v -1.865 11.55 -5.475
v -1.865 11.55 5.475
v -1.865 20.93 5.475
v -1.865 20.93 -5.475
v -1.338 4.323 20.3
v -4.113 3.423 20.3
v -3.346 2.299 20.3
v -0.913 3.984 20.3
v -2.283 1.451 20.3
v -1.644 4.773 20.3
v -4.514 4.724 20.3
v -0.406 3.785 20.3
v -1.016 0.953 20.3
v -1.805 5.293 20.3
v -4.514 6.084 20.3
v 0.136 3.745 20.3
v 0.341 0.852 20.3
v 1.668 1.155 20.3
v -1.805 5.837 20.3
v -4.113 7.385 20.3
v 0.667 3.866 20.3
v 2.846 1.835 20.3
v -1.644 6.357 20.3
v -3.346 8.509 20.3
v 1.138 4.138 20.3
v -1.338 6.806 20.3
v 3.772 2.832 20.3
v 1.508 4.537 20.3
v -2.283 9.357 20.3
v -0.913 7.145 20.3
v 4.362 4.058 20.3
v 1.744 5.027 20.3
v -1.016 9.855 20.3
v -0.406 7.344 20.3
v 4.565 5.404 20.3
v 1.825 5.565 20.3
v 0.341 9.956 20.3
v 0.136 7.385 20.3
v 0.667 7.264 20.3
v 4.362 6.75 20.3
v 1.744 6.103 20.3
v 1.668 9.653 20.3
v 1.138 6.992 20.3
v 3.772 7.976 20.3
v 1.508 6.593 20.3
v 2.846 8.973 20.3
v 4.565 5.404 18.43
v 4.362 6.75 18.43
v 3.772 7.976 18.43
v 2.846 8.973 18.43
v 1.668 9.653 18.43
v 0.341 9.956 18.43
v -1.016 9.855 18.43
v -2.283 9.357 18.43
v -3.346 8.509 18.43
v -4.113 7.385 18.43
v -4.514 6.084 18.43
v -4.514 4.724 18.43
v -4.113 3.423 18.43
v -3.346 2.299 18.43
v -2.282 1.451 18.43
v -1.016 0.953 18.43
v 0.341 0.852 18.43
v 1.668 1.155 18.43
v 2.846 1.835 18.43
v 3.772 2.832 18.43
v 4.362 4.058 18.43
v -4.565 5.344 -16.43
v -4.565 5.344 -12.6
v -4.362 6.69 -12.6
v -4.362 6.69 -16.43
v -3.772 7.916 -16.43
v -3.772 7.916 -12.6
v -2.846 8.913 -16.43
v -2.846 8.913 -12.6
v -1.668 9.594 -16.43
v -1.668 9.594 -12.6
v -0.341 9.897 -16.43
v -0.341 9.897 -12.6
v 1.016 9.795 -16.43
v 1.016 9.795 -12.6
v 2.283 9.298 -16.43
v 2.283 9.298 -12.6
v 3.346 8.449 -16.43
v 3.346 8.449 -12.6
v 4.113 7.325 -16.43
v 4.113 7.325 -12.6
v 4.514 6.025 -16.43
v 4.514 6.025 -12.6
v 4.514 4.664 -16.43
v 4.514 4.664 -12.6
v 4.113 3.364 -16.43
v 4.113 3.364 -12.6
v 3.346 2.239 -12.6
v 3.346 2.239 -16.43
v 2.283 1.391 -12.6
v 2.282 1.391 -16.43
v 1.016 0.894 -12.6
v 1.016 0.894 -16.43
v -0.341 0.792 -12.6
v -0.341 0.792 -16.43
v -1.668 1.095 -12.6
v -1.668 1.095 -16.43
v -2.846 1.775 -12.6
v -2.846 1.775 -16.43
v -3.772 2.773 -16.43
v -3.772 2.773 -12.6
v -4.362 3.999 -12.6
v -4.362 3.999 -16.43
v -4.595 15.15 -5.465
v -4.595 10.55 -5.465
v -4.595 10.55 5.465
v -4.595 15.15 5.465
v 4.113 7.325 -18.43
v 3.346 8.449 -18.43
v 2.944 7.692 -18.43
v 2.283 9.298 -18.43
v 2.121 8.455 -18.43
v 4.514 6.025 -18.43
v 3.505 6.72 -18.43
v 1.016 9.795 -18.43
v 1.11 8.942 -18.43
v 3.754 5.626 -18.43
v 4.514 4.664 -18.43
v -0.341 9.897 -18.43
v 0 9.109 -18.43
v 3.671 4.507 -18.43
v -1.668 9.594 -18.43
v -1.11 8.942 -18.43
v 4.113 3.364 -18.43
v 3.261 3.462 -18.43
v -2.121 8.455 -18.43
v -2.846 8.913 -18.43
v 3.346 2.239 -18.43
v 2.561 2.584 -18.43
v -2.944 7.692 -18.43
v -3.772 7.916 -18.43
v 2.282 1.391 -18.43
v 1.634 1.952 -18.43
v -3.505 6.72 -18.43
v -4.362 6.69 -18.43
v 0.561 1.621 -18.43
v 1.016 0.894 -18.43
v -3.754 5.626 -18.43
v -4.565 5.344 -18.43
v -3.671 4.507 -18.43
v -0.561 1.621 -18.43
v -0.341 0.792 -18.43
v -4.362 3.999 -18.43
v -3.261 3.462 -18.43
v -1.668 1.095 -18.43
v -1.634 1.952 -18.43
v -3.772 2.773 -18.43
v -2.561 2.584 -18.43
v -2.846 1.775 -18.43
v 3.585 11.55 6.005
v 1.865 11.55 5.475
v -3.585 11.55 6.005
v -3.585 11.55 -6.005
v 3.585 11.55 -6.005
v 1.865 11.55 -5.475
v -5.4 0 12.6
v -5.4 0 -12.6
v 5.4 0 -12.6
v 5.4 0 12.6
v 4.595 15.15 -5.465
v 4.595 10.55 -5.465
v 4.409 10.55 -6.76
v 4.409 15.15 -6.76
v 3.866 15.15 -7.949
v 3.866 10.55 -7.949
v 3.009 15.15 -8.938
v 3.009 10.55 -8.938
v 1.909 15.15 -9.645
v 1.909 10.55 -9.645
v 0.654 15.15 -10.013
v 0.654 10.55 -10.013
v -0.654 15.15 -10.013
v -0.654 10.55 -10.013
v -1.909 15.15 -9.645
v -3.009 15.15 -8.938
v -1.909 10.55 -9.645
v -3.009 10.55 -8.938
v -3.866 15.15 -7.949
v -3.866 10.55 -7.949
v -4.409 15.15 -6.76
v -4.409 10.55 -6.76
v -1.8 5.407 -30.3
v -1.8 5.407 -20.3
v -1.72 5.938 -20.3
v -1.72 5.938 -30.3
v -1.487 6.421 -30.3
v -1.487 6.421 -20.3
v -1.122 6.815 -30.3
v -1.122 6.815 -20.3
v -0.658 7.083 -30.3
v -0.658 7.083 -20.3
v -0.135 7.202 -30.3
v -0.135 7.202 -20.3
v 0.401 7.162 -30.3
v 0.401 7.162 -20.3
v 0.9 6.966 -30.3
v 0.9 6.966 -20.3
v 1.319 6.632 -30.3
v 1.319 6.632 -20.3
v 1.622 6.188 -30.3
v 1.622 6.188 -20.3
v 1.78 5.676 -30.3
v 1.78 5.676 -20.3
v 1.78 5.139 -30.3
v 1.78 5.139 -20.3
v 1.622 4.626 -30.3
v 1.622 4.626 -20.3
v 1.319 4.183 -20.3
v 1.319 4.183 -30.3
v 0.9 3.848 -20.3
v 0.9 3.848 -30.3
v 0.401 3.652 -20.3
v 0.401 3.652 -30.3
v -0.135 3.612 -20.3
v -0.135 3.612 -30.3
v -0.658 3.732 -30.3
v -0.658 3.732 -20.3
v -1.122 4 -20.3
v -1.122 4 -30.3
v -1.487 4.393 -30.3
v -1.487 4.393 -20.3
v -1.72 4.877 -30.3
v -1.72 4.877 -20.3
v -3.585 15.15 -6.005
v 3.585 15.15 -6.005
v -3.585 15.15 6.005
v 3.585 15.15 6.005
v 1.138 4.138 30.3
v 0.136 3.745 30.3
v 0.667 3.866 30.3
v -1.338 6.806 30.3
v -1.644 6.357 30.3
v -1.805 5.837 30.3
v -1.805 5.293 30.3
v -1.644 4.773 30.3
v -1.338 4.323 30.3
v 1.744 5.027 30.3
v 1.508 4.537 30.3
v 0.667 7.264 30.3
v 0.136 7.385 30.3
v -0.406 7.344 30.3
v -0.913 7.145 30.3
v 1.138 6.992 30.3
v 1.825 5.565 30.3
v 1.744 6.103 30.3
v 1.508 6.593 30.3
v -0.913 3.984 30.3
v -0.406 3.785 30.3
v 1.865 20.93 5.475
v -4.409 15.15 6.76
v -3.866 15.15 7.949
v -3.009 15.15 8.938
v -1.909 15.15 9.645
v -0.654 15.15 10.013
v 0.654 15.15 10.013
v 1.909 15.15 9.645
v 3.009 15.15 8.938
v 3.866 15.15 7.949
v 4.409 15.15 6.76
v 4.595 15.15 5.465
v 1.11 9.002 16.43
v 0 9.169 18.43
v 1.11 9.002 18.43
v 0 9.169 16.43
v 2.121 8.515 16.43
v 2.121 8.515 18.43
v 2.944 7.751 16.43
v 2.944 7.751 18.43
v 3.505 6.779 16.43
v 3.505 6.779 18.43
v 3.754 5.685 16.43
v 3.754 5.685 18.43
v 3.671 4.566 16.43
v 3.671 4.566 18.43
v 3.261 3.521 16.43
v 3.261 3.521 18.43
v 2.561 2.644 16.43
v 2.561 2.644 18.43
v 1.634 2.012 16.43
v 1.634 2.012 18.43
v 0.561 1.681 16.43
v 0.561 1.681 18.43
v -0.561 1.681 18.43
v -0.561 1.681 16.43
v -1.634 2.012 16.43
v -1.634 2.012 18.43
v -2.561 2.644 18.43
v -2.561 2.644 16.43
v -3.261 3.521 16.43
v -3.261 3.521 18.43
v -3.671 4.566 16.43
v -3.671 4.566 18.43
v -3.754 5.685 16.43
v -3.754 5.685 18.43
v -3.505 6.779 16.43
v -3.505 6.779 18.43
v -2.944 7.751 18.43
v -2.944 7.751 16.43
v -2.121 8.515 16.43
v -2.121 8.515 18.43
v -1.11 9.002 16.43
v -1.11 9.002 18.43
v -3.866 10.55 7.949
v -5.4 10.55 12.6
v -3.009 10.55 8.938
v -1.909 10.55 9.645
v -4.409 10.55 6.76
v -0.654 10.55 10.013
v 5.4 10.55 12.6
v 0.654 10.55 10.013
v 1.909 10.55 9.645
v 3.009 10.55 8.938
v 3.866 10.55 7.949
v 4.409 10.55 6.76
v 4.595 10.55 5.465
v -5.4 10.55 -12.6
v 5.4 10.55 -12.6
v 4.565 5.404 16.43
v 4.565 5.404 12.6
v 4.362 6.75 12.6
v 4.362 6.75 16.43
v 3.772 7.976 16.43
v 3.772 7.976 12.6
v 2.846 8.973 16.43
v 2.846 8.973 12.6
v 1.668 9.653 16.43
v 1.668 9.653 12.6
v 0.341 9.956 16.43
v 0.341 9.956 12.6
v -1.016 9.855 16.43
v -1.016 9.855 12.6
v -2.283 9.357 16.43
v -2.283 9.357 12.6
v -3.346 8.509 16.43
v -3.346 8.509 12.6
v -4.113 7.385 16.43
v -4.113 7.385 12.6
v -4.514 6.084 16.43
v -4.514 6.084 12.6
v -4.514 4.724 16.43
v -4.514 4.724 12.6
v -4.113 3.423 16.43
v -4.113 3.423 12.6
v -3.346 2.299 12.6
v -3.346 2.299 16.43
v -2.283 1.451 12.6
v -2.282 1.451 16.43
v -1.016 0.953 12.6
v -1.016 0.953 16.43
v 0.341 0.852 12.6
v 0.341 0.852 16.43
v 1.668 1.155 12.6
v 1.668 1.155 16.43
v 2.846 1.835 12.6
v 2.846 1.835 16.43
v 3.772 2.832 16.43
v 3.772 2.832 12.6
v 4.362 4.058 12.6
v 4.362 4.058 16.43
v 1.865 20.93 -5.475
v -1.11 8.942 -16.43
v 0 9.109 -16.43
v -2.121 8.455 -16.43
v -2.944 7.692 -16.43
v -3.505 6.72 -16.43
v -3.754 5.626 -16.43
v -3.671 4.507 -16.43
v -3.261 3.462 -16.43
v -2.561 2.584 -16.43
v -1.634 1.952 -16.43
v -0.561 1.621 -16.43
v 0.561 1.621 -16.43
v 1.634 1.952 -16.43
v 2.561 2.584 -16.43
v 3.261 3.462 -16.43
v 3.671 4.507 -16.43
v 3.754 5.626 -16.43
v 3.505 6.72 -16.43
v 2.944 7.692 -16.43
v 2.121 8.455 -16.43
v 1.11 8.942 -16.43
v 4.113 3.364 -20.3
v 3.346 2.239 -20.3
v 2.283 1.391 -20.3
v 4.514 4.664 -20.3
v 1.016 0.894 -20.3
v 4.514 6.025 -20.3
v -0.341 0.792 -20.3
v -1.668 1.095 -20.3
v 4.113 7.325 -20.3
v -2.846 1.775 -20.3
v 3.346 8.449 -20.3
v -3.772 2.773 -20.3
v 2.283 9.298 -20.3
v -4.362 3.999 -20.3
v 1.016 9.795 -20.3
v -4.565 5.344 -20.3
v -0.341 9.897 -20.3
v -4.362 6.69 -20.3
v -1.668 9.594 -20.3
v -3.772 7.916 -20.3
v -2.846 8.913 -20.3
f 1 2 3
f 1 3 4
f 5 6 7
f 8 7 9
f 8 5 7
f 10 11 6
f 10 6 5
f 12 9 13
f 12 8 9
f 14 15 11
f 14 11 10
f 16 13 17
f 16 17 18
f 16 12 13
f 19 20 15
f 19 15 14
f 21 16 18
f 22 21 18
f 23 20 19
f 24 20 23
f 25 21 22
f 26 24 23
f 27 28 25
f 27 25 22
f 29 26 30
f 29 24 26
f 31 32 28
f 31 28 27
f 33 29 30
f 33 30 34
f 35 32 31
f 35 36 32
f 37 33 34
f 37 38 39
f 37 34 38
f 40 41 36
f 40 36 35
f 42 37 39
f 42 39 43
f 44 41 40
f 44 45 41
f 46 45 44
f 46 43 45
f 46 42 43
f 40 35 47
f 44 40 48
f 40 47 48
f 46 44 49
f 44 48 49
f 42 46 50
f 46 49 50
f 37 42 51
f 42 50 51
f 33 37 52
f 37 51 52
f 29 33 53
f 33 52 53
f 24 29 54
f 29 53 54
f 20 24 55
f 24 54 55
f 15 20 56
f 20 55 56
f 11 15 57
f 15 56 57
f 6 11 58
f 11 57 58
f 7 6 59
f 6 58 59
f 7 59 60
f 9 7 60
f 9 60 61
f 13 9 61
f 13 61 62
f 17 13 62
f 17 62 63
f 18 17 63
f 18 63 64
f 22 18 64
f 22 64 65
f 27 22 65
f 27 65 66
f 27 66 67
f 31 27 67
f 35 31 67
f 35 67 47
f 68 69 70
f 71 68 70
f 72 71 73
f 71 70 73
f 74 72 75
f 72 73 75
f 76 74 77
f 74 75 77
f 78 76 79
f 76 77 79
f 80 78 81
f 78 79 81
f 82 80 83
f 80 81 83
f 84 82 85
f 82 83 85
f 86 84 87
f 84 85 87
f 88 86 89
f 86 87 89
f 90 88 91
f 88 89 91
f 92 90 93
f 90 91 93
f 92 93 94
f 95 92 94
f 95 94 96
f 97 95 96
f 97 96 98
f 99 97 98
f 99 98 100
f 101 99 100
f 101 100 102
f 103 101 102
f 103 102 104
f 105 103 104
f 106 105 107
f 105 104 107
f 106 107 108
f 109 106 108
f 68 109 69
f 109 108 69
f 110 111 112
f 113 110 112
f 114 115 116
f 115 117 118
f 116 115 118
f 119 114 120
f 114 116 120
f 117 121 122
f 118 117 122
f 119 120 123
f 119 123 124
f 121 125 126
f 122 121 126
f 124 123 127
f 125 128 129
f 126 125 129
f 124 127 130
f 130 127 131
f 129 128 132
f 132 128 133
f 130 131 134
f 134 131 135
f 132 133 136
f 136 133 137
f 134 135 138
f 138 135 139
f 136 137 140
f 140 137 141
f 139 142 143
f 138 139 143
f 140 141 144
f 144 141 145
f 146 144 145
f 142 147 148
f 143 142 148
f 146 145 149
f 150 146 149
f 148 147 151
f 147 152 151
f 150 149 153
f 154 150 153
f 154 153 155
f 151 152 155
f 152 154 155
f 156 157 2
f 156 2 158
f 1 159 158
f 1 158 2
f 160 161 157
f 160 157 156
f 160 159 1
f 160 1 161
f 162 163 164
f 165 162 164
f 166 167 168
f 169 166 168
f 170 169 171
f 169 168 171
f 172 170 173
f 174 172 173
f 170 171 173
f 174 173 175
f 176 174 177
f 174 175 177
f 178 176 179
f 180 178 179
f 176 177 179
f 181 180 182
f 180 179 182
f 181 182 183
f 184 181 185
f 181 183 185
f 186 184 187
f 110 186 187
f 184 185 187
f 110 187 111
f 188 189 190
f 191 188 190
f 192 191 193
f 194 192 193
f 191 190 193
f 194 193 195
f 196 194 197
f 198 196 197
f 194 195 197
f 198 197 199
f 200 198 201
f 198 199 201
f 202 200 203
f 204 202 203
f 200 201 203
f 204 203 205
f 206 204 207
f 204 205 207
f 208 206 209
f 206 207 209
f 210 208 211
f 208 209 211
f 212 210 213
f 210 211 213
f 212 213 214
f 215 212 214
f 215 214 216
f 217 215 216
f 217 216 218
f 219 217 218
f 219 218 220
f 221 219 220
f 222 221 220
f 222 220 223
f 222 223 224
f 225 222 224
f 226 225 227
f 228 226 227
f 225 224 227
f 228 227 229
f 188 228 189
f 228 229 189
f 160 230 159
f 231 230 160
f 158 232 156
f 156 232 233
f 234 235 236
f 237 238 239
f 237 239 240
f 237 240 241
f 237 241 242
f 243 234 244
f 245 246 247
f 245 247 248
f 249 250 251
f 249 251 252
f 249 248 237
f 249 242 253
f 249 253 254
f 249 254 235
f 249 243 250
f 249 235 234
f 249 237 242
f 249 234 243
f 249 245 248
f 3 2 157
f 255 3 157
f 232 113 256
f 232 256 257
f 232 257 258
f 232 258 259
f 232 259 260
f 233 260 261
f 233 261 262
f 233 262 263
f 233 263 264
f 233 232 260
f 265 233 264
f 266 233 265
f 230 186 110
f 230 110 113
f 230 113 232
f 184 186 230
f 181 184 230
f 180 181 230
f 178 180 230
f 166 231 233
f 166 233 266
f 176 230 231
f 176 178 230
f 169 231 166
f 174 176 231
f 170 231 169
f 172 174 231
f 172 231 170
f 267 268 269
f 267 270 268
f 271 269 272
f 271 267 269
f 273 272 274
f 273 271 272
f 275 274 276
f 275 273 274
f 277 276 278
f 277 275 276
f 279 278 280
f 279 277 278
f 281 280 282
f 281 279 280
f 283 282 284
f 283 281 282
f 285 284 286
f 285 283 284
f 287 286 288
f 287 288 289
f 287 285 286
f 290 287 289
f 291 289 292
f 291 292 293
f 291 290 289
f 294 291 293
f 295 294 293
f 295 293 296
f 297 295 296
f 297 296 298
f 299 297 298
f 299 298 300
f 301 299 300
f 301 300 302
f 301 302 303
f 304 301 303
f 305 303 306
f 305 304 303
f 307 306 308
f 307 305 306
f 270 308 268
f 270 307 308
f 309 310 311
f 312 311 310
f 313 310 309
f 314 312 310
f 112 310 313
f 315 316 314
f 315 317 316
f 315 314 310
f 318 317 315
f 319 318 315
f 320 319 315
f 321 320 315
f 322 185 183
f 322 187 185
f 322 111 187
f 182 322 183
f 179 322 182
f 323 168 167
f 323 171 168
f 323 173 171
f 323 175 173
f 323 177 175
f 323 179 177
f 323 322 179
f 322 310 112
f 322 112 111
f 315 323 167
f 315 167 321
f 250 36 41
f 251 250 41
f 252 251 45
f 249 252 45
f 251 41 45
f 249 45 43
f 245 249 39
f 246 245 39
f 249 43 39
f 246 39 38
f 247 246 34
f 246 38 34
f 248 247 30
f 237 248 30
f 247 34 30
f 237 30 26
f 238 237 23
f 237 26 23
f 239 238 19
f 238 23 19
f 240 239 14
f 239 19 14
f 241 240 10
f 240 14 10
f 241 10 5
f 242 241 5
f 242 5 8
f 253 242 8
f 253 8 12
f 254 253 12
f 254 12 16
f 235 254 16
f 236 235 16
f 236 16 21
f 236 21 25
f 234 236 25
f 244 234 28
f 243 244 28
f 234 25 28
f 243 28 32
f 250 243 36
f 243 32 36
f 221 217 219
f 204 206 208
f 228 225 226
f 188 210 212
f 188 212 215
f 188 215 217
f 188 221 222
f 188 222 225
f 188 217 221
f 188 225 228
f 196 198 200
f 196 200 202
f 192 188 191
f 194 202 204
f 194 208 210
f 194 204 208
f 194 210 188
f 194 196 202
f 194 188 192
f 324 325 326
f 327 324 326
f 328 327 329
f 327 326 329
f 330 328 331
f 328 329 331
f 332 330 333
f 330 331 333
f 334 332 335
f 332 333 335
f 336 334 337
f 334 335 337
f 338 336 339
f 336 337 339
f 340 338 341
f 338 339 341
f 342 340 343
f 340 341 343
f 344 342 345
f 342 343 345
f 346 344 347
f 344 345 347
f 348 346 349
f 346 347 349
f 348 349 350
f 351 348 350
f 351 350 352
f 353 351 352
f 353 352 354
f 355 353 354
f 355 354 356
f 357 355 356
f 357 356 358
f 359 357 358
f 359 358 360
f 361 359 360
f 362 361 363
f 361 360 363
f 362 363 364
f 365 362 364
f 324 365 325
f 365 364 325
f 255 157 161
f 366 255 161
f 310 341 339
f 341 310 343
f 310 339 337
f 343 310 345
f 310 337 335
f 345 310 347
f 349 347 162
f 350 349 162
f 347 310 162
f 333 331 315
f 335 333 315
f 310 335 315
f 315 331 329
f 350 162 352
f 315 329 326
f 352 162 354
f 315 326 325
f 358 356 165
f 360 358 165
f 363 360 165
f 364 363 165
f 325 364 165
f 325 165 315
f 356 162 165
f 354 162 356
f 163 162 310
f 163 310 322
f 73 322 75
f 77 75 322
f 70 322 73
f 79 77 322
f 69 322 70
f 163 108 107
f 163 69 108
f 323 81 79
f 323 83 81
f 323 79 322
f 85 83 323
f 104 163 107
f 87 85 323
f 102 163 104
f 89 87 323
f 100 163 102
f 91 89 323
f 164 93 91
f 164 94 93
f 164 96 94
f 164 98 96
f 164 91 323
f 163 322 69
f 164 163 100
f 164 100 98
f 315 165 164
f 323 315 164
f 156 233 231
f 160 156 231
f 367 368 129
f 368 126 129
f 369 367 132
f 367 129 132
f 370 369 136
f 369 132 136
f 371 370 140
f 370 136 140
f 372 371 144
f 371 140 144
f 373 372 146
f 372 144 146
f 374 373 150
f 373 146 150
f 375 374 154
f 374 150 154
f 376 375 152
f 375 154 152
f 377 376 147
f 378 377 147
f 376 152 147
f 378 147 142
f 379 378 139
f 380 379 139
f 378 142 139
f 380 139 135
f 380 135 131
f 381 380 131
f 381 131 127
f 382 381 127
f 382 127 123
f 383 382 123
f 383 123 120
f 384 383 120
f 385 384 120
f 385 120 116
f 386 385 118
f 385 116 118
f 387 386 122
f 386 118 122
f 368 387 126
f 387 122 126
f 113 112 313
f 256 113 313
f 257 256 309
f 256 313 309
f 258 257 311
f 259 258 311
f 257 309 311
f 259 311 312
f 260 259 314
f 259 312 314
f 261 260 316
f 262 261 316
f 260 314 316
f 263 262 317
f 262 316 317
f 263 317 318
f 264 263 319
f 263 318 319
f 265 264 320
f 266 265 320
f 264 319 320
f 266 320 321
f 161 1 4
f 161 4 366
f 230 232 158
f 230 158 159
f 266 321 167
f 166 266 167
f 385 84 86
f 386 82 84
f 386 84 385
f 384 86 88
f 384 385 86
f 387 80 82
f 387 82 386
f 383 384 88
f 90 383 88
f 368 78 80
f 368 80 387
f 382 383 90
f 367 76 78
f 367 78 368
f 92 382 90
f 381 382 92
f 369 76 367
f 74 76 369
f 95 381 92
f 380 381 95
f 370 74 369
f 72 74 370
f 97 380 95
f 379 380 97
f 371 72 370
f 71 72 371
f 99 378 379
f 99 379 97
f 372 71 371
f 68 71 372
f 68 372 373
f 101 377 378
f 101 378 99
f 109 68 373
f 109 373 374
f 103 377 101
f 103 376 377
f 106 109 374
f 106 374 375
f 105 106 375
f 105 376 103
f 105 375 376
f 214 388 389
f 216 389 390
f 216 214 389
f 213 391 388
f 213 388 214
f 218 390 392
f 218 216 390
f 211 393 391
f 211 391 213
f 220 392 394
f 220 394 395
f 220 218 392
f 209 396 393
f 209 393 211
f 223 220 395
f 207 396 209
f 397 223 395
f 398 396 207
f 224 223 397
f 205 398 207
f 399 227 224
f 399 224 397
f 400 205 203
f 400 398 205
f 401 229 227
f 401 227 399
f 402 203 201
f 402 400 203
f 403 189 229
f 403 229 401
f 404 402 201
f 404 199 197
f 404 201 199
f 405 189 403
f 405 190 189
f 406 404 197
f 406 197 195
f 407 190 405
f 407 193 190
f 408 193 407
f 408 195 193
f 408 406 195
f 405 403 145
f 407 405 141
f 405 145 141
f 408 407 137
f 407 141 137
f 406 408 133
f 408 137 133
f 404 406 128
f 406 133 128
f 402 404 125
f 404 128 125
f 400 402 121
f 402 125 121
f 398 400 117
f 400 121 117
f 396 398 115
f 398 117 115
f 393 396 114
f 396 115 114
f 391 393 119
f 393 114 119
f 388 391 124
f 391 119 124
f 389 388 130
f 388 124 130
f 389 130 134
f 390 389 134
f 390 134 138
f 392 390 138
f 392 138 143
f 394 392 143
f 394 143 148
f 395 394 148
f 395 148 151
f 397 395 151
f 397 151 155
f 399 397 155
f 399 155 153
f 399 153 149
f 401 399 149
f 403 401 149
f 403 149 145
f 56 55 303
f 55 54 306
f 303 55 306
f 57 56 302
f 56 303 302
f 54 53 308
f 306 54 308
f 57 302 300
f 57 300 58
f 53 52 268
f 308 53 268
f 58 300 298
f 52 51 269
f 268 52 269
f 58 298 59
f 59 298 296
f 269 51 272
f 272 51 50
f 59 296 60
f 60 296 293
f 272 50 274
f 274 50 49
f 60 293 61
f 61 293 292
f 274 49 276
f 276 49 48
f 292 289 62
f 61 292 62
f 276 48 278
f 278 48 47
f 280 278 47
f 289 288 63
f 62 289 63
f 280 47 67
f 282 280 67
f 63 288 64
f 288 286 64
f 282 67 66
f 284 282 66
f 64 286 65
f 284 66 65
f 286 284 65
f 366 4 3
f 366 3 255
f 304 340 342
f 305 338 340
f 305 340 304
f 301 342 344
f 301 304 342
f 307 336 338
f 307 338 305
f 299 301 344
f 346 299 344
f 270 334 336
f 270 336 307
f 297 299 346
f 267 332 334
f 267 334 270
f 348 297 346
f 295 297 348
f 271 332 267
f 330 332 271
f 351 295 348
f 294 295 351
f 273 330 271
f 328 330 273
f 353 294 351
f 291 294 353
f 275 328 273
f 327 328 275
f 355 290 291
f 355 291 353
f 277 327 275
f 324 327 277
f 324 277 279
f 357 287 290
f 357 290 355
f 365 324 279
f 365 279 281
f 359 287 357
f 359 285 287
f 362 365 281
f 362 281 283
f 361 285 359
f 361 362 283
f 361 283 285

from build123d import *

# Parameters (mm, degrees)
SKETCH1_W           = 10.8
SKETCH1_H           = 25.2
BOSS_EXTRUDE1_DEPTH = 10.55
SKETCH2_R           = 4.565
BOSS_EXTRUDE2_DEPTH = 7.7
SKETCH3_R           = 4.565
BOSS_EXTRUDE3_DEPTH = 7.7
SKETCH4_W           = 2
SKETCH4_H           = 0.8
SKETCH5_W           = 2
SKETCH5_H           = 0.8
BOSS_EXTRUDE4_DEPTH = 4.6
SKETCH7_W           = 7.17
SKETCH7_H           = 12.01
CUT_EXTRUDE1_DEPTH  = 3.6
SKETCH8_W           = 3.73
SKETCH8_H           = 10.95
BOSS_EXTRUDE5_DEPTH = 9.38
SKETCH9_R           = 1.8
BOSS_EXTRUDE6_DEPTH = 10
SKETCH11_R          = 1.825
BOSS_EXTRUDE7_DEPTH = 10


with BuildPart() as part:
    # Sketch1 → Boss-Extrude1 (new body)
    with BuildSketch(Plane(origin=(0, 0, 0), x_dir=(1, 0, 0), z_dir=(0, 1, 0))):
        Rectangle(SKETCH1_W, SKETCH1_H)
    extrude(amount=BOSS_EXTRUDE1_DEPTH)

    # Sketch2 → Boss-Extrude2 (add)
    with BuildSketch(Plane.XY.offset(12.6)):
        with Locations((0, 5.403958649)):
            Circle(SKETCH2_R)
    extrude(amount=BOSS_EXTRUDE2_DEPTH)

    # Sketch3 → Boss-Extrude3 (add)
    with BuildSketch(Plane(origin=(0, 0, -12.6), x_dir=(-1, 0, 0), z_dir=(0, 0, -1))):
        with Locations((0, 5.344439272)):
            Circle(SKETCH3_R)
    extrude(amount=BOSS_EXTRUDE3_DEPTH)

    # Sketch4 → Cut-Revolve1 (revolve, cut)
    with BuildSketch(Plane(origin=(0, 0, 0), x_dir=(0, 0, -1), z_dir=(1, 0, 0))):
        with Locations((-17.43, 9.568958649)):
            Rectangle(SKETCH4_W, SKETCH4_H)
    revolve(axis=Axis((0, 5.403958649, 20.3), (0, 0, -1)), mode=Mode.SUBTRACT)

    # Sketch5 → Cut-Revolve2 (revolve, cut)
    with BuildSketch(Plane(origin=(0, 0, 0), x_dir=(0, 0, -1), z_dir=(1, 0, 0))):
        with Locations((17.43, 9.509439272)):
            Rectangle(SKETCH5_W, SKETCH5_H)
    revolve(axis=Axis((0, 5.344439272, -20.3), (0, 0, 1)), mode=Mode.SUBTRACT)

    # Sketch6 → Boss-Extrude4 (add)
    with BuildSketch(Plane(origin=(0, 10.55, 0), x_dir=(1, 0, 0), z_dir=(0, 1, 0))):
        with BuildLine():
            Line((4.595, -5.465), (4.595, 5.465))
            ThreePointArc((4.595, 5.465), (0, 10.06), (-4.595, 5.465))
            Line((-4.595, 5.465), (-4.595, -5.465))
            ThreePointArc((-4.595, -5.465), (0, -10.06), (4.595, -5.465))
        make_face()
    extrude(amount=BOSS_EXTRUDE4_DEPTH)

    # Sketch7 → Cut-Extrude1 (cut)
    with BuildSketch(Plane(origin=(0, 15.15, 0), x_dir=(1, 0, 0), z_dir=(0, 1, 0))):
        Rectangle(SKETCH7_W, SKETCH7_H)
    extrude(amount=-CUT_EXTRUDE1_DEPTH, mode=Mode.SUBTRACT)

    # Sketch8 → Boss-Extrude5 (add)
    with BuildSketch(Plane(origin=(0, 11.55, 0), x_dir=(1, 0, 0), z_dir=(0, 1, 0))):
        Rectangle(SKETCH8_W, SKETCH8_H)
    extrude(amount=BOSS_EXTRUDE5_DEPTH)

    # Sketch9 → Boss-Extrude6 (add)
    with BuildSketch(Plane(origin=(0, 0, -20.3), x_dir=(-1, 0, 0), z_dir=(0, 0, -1))):
        with Locations((0, 5.407254025)):
            Circle(SKETCH9_R)
    extrude(amount=BOSS_EXTRUDE6_DEPTH)

    # Sketch11 → Boss-Extrude7 (add)
    with BuildSketch(Plane.XY.offset(20.3)):
        with Locations((0, 5.564693588)):
            Circle(SKETCH11_R)
    extrude(amount=BOSS_EXTRUDE7_DEPTH)


solid = part.part
